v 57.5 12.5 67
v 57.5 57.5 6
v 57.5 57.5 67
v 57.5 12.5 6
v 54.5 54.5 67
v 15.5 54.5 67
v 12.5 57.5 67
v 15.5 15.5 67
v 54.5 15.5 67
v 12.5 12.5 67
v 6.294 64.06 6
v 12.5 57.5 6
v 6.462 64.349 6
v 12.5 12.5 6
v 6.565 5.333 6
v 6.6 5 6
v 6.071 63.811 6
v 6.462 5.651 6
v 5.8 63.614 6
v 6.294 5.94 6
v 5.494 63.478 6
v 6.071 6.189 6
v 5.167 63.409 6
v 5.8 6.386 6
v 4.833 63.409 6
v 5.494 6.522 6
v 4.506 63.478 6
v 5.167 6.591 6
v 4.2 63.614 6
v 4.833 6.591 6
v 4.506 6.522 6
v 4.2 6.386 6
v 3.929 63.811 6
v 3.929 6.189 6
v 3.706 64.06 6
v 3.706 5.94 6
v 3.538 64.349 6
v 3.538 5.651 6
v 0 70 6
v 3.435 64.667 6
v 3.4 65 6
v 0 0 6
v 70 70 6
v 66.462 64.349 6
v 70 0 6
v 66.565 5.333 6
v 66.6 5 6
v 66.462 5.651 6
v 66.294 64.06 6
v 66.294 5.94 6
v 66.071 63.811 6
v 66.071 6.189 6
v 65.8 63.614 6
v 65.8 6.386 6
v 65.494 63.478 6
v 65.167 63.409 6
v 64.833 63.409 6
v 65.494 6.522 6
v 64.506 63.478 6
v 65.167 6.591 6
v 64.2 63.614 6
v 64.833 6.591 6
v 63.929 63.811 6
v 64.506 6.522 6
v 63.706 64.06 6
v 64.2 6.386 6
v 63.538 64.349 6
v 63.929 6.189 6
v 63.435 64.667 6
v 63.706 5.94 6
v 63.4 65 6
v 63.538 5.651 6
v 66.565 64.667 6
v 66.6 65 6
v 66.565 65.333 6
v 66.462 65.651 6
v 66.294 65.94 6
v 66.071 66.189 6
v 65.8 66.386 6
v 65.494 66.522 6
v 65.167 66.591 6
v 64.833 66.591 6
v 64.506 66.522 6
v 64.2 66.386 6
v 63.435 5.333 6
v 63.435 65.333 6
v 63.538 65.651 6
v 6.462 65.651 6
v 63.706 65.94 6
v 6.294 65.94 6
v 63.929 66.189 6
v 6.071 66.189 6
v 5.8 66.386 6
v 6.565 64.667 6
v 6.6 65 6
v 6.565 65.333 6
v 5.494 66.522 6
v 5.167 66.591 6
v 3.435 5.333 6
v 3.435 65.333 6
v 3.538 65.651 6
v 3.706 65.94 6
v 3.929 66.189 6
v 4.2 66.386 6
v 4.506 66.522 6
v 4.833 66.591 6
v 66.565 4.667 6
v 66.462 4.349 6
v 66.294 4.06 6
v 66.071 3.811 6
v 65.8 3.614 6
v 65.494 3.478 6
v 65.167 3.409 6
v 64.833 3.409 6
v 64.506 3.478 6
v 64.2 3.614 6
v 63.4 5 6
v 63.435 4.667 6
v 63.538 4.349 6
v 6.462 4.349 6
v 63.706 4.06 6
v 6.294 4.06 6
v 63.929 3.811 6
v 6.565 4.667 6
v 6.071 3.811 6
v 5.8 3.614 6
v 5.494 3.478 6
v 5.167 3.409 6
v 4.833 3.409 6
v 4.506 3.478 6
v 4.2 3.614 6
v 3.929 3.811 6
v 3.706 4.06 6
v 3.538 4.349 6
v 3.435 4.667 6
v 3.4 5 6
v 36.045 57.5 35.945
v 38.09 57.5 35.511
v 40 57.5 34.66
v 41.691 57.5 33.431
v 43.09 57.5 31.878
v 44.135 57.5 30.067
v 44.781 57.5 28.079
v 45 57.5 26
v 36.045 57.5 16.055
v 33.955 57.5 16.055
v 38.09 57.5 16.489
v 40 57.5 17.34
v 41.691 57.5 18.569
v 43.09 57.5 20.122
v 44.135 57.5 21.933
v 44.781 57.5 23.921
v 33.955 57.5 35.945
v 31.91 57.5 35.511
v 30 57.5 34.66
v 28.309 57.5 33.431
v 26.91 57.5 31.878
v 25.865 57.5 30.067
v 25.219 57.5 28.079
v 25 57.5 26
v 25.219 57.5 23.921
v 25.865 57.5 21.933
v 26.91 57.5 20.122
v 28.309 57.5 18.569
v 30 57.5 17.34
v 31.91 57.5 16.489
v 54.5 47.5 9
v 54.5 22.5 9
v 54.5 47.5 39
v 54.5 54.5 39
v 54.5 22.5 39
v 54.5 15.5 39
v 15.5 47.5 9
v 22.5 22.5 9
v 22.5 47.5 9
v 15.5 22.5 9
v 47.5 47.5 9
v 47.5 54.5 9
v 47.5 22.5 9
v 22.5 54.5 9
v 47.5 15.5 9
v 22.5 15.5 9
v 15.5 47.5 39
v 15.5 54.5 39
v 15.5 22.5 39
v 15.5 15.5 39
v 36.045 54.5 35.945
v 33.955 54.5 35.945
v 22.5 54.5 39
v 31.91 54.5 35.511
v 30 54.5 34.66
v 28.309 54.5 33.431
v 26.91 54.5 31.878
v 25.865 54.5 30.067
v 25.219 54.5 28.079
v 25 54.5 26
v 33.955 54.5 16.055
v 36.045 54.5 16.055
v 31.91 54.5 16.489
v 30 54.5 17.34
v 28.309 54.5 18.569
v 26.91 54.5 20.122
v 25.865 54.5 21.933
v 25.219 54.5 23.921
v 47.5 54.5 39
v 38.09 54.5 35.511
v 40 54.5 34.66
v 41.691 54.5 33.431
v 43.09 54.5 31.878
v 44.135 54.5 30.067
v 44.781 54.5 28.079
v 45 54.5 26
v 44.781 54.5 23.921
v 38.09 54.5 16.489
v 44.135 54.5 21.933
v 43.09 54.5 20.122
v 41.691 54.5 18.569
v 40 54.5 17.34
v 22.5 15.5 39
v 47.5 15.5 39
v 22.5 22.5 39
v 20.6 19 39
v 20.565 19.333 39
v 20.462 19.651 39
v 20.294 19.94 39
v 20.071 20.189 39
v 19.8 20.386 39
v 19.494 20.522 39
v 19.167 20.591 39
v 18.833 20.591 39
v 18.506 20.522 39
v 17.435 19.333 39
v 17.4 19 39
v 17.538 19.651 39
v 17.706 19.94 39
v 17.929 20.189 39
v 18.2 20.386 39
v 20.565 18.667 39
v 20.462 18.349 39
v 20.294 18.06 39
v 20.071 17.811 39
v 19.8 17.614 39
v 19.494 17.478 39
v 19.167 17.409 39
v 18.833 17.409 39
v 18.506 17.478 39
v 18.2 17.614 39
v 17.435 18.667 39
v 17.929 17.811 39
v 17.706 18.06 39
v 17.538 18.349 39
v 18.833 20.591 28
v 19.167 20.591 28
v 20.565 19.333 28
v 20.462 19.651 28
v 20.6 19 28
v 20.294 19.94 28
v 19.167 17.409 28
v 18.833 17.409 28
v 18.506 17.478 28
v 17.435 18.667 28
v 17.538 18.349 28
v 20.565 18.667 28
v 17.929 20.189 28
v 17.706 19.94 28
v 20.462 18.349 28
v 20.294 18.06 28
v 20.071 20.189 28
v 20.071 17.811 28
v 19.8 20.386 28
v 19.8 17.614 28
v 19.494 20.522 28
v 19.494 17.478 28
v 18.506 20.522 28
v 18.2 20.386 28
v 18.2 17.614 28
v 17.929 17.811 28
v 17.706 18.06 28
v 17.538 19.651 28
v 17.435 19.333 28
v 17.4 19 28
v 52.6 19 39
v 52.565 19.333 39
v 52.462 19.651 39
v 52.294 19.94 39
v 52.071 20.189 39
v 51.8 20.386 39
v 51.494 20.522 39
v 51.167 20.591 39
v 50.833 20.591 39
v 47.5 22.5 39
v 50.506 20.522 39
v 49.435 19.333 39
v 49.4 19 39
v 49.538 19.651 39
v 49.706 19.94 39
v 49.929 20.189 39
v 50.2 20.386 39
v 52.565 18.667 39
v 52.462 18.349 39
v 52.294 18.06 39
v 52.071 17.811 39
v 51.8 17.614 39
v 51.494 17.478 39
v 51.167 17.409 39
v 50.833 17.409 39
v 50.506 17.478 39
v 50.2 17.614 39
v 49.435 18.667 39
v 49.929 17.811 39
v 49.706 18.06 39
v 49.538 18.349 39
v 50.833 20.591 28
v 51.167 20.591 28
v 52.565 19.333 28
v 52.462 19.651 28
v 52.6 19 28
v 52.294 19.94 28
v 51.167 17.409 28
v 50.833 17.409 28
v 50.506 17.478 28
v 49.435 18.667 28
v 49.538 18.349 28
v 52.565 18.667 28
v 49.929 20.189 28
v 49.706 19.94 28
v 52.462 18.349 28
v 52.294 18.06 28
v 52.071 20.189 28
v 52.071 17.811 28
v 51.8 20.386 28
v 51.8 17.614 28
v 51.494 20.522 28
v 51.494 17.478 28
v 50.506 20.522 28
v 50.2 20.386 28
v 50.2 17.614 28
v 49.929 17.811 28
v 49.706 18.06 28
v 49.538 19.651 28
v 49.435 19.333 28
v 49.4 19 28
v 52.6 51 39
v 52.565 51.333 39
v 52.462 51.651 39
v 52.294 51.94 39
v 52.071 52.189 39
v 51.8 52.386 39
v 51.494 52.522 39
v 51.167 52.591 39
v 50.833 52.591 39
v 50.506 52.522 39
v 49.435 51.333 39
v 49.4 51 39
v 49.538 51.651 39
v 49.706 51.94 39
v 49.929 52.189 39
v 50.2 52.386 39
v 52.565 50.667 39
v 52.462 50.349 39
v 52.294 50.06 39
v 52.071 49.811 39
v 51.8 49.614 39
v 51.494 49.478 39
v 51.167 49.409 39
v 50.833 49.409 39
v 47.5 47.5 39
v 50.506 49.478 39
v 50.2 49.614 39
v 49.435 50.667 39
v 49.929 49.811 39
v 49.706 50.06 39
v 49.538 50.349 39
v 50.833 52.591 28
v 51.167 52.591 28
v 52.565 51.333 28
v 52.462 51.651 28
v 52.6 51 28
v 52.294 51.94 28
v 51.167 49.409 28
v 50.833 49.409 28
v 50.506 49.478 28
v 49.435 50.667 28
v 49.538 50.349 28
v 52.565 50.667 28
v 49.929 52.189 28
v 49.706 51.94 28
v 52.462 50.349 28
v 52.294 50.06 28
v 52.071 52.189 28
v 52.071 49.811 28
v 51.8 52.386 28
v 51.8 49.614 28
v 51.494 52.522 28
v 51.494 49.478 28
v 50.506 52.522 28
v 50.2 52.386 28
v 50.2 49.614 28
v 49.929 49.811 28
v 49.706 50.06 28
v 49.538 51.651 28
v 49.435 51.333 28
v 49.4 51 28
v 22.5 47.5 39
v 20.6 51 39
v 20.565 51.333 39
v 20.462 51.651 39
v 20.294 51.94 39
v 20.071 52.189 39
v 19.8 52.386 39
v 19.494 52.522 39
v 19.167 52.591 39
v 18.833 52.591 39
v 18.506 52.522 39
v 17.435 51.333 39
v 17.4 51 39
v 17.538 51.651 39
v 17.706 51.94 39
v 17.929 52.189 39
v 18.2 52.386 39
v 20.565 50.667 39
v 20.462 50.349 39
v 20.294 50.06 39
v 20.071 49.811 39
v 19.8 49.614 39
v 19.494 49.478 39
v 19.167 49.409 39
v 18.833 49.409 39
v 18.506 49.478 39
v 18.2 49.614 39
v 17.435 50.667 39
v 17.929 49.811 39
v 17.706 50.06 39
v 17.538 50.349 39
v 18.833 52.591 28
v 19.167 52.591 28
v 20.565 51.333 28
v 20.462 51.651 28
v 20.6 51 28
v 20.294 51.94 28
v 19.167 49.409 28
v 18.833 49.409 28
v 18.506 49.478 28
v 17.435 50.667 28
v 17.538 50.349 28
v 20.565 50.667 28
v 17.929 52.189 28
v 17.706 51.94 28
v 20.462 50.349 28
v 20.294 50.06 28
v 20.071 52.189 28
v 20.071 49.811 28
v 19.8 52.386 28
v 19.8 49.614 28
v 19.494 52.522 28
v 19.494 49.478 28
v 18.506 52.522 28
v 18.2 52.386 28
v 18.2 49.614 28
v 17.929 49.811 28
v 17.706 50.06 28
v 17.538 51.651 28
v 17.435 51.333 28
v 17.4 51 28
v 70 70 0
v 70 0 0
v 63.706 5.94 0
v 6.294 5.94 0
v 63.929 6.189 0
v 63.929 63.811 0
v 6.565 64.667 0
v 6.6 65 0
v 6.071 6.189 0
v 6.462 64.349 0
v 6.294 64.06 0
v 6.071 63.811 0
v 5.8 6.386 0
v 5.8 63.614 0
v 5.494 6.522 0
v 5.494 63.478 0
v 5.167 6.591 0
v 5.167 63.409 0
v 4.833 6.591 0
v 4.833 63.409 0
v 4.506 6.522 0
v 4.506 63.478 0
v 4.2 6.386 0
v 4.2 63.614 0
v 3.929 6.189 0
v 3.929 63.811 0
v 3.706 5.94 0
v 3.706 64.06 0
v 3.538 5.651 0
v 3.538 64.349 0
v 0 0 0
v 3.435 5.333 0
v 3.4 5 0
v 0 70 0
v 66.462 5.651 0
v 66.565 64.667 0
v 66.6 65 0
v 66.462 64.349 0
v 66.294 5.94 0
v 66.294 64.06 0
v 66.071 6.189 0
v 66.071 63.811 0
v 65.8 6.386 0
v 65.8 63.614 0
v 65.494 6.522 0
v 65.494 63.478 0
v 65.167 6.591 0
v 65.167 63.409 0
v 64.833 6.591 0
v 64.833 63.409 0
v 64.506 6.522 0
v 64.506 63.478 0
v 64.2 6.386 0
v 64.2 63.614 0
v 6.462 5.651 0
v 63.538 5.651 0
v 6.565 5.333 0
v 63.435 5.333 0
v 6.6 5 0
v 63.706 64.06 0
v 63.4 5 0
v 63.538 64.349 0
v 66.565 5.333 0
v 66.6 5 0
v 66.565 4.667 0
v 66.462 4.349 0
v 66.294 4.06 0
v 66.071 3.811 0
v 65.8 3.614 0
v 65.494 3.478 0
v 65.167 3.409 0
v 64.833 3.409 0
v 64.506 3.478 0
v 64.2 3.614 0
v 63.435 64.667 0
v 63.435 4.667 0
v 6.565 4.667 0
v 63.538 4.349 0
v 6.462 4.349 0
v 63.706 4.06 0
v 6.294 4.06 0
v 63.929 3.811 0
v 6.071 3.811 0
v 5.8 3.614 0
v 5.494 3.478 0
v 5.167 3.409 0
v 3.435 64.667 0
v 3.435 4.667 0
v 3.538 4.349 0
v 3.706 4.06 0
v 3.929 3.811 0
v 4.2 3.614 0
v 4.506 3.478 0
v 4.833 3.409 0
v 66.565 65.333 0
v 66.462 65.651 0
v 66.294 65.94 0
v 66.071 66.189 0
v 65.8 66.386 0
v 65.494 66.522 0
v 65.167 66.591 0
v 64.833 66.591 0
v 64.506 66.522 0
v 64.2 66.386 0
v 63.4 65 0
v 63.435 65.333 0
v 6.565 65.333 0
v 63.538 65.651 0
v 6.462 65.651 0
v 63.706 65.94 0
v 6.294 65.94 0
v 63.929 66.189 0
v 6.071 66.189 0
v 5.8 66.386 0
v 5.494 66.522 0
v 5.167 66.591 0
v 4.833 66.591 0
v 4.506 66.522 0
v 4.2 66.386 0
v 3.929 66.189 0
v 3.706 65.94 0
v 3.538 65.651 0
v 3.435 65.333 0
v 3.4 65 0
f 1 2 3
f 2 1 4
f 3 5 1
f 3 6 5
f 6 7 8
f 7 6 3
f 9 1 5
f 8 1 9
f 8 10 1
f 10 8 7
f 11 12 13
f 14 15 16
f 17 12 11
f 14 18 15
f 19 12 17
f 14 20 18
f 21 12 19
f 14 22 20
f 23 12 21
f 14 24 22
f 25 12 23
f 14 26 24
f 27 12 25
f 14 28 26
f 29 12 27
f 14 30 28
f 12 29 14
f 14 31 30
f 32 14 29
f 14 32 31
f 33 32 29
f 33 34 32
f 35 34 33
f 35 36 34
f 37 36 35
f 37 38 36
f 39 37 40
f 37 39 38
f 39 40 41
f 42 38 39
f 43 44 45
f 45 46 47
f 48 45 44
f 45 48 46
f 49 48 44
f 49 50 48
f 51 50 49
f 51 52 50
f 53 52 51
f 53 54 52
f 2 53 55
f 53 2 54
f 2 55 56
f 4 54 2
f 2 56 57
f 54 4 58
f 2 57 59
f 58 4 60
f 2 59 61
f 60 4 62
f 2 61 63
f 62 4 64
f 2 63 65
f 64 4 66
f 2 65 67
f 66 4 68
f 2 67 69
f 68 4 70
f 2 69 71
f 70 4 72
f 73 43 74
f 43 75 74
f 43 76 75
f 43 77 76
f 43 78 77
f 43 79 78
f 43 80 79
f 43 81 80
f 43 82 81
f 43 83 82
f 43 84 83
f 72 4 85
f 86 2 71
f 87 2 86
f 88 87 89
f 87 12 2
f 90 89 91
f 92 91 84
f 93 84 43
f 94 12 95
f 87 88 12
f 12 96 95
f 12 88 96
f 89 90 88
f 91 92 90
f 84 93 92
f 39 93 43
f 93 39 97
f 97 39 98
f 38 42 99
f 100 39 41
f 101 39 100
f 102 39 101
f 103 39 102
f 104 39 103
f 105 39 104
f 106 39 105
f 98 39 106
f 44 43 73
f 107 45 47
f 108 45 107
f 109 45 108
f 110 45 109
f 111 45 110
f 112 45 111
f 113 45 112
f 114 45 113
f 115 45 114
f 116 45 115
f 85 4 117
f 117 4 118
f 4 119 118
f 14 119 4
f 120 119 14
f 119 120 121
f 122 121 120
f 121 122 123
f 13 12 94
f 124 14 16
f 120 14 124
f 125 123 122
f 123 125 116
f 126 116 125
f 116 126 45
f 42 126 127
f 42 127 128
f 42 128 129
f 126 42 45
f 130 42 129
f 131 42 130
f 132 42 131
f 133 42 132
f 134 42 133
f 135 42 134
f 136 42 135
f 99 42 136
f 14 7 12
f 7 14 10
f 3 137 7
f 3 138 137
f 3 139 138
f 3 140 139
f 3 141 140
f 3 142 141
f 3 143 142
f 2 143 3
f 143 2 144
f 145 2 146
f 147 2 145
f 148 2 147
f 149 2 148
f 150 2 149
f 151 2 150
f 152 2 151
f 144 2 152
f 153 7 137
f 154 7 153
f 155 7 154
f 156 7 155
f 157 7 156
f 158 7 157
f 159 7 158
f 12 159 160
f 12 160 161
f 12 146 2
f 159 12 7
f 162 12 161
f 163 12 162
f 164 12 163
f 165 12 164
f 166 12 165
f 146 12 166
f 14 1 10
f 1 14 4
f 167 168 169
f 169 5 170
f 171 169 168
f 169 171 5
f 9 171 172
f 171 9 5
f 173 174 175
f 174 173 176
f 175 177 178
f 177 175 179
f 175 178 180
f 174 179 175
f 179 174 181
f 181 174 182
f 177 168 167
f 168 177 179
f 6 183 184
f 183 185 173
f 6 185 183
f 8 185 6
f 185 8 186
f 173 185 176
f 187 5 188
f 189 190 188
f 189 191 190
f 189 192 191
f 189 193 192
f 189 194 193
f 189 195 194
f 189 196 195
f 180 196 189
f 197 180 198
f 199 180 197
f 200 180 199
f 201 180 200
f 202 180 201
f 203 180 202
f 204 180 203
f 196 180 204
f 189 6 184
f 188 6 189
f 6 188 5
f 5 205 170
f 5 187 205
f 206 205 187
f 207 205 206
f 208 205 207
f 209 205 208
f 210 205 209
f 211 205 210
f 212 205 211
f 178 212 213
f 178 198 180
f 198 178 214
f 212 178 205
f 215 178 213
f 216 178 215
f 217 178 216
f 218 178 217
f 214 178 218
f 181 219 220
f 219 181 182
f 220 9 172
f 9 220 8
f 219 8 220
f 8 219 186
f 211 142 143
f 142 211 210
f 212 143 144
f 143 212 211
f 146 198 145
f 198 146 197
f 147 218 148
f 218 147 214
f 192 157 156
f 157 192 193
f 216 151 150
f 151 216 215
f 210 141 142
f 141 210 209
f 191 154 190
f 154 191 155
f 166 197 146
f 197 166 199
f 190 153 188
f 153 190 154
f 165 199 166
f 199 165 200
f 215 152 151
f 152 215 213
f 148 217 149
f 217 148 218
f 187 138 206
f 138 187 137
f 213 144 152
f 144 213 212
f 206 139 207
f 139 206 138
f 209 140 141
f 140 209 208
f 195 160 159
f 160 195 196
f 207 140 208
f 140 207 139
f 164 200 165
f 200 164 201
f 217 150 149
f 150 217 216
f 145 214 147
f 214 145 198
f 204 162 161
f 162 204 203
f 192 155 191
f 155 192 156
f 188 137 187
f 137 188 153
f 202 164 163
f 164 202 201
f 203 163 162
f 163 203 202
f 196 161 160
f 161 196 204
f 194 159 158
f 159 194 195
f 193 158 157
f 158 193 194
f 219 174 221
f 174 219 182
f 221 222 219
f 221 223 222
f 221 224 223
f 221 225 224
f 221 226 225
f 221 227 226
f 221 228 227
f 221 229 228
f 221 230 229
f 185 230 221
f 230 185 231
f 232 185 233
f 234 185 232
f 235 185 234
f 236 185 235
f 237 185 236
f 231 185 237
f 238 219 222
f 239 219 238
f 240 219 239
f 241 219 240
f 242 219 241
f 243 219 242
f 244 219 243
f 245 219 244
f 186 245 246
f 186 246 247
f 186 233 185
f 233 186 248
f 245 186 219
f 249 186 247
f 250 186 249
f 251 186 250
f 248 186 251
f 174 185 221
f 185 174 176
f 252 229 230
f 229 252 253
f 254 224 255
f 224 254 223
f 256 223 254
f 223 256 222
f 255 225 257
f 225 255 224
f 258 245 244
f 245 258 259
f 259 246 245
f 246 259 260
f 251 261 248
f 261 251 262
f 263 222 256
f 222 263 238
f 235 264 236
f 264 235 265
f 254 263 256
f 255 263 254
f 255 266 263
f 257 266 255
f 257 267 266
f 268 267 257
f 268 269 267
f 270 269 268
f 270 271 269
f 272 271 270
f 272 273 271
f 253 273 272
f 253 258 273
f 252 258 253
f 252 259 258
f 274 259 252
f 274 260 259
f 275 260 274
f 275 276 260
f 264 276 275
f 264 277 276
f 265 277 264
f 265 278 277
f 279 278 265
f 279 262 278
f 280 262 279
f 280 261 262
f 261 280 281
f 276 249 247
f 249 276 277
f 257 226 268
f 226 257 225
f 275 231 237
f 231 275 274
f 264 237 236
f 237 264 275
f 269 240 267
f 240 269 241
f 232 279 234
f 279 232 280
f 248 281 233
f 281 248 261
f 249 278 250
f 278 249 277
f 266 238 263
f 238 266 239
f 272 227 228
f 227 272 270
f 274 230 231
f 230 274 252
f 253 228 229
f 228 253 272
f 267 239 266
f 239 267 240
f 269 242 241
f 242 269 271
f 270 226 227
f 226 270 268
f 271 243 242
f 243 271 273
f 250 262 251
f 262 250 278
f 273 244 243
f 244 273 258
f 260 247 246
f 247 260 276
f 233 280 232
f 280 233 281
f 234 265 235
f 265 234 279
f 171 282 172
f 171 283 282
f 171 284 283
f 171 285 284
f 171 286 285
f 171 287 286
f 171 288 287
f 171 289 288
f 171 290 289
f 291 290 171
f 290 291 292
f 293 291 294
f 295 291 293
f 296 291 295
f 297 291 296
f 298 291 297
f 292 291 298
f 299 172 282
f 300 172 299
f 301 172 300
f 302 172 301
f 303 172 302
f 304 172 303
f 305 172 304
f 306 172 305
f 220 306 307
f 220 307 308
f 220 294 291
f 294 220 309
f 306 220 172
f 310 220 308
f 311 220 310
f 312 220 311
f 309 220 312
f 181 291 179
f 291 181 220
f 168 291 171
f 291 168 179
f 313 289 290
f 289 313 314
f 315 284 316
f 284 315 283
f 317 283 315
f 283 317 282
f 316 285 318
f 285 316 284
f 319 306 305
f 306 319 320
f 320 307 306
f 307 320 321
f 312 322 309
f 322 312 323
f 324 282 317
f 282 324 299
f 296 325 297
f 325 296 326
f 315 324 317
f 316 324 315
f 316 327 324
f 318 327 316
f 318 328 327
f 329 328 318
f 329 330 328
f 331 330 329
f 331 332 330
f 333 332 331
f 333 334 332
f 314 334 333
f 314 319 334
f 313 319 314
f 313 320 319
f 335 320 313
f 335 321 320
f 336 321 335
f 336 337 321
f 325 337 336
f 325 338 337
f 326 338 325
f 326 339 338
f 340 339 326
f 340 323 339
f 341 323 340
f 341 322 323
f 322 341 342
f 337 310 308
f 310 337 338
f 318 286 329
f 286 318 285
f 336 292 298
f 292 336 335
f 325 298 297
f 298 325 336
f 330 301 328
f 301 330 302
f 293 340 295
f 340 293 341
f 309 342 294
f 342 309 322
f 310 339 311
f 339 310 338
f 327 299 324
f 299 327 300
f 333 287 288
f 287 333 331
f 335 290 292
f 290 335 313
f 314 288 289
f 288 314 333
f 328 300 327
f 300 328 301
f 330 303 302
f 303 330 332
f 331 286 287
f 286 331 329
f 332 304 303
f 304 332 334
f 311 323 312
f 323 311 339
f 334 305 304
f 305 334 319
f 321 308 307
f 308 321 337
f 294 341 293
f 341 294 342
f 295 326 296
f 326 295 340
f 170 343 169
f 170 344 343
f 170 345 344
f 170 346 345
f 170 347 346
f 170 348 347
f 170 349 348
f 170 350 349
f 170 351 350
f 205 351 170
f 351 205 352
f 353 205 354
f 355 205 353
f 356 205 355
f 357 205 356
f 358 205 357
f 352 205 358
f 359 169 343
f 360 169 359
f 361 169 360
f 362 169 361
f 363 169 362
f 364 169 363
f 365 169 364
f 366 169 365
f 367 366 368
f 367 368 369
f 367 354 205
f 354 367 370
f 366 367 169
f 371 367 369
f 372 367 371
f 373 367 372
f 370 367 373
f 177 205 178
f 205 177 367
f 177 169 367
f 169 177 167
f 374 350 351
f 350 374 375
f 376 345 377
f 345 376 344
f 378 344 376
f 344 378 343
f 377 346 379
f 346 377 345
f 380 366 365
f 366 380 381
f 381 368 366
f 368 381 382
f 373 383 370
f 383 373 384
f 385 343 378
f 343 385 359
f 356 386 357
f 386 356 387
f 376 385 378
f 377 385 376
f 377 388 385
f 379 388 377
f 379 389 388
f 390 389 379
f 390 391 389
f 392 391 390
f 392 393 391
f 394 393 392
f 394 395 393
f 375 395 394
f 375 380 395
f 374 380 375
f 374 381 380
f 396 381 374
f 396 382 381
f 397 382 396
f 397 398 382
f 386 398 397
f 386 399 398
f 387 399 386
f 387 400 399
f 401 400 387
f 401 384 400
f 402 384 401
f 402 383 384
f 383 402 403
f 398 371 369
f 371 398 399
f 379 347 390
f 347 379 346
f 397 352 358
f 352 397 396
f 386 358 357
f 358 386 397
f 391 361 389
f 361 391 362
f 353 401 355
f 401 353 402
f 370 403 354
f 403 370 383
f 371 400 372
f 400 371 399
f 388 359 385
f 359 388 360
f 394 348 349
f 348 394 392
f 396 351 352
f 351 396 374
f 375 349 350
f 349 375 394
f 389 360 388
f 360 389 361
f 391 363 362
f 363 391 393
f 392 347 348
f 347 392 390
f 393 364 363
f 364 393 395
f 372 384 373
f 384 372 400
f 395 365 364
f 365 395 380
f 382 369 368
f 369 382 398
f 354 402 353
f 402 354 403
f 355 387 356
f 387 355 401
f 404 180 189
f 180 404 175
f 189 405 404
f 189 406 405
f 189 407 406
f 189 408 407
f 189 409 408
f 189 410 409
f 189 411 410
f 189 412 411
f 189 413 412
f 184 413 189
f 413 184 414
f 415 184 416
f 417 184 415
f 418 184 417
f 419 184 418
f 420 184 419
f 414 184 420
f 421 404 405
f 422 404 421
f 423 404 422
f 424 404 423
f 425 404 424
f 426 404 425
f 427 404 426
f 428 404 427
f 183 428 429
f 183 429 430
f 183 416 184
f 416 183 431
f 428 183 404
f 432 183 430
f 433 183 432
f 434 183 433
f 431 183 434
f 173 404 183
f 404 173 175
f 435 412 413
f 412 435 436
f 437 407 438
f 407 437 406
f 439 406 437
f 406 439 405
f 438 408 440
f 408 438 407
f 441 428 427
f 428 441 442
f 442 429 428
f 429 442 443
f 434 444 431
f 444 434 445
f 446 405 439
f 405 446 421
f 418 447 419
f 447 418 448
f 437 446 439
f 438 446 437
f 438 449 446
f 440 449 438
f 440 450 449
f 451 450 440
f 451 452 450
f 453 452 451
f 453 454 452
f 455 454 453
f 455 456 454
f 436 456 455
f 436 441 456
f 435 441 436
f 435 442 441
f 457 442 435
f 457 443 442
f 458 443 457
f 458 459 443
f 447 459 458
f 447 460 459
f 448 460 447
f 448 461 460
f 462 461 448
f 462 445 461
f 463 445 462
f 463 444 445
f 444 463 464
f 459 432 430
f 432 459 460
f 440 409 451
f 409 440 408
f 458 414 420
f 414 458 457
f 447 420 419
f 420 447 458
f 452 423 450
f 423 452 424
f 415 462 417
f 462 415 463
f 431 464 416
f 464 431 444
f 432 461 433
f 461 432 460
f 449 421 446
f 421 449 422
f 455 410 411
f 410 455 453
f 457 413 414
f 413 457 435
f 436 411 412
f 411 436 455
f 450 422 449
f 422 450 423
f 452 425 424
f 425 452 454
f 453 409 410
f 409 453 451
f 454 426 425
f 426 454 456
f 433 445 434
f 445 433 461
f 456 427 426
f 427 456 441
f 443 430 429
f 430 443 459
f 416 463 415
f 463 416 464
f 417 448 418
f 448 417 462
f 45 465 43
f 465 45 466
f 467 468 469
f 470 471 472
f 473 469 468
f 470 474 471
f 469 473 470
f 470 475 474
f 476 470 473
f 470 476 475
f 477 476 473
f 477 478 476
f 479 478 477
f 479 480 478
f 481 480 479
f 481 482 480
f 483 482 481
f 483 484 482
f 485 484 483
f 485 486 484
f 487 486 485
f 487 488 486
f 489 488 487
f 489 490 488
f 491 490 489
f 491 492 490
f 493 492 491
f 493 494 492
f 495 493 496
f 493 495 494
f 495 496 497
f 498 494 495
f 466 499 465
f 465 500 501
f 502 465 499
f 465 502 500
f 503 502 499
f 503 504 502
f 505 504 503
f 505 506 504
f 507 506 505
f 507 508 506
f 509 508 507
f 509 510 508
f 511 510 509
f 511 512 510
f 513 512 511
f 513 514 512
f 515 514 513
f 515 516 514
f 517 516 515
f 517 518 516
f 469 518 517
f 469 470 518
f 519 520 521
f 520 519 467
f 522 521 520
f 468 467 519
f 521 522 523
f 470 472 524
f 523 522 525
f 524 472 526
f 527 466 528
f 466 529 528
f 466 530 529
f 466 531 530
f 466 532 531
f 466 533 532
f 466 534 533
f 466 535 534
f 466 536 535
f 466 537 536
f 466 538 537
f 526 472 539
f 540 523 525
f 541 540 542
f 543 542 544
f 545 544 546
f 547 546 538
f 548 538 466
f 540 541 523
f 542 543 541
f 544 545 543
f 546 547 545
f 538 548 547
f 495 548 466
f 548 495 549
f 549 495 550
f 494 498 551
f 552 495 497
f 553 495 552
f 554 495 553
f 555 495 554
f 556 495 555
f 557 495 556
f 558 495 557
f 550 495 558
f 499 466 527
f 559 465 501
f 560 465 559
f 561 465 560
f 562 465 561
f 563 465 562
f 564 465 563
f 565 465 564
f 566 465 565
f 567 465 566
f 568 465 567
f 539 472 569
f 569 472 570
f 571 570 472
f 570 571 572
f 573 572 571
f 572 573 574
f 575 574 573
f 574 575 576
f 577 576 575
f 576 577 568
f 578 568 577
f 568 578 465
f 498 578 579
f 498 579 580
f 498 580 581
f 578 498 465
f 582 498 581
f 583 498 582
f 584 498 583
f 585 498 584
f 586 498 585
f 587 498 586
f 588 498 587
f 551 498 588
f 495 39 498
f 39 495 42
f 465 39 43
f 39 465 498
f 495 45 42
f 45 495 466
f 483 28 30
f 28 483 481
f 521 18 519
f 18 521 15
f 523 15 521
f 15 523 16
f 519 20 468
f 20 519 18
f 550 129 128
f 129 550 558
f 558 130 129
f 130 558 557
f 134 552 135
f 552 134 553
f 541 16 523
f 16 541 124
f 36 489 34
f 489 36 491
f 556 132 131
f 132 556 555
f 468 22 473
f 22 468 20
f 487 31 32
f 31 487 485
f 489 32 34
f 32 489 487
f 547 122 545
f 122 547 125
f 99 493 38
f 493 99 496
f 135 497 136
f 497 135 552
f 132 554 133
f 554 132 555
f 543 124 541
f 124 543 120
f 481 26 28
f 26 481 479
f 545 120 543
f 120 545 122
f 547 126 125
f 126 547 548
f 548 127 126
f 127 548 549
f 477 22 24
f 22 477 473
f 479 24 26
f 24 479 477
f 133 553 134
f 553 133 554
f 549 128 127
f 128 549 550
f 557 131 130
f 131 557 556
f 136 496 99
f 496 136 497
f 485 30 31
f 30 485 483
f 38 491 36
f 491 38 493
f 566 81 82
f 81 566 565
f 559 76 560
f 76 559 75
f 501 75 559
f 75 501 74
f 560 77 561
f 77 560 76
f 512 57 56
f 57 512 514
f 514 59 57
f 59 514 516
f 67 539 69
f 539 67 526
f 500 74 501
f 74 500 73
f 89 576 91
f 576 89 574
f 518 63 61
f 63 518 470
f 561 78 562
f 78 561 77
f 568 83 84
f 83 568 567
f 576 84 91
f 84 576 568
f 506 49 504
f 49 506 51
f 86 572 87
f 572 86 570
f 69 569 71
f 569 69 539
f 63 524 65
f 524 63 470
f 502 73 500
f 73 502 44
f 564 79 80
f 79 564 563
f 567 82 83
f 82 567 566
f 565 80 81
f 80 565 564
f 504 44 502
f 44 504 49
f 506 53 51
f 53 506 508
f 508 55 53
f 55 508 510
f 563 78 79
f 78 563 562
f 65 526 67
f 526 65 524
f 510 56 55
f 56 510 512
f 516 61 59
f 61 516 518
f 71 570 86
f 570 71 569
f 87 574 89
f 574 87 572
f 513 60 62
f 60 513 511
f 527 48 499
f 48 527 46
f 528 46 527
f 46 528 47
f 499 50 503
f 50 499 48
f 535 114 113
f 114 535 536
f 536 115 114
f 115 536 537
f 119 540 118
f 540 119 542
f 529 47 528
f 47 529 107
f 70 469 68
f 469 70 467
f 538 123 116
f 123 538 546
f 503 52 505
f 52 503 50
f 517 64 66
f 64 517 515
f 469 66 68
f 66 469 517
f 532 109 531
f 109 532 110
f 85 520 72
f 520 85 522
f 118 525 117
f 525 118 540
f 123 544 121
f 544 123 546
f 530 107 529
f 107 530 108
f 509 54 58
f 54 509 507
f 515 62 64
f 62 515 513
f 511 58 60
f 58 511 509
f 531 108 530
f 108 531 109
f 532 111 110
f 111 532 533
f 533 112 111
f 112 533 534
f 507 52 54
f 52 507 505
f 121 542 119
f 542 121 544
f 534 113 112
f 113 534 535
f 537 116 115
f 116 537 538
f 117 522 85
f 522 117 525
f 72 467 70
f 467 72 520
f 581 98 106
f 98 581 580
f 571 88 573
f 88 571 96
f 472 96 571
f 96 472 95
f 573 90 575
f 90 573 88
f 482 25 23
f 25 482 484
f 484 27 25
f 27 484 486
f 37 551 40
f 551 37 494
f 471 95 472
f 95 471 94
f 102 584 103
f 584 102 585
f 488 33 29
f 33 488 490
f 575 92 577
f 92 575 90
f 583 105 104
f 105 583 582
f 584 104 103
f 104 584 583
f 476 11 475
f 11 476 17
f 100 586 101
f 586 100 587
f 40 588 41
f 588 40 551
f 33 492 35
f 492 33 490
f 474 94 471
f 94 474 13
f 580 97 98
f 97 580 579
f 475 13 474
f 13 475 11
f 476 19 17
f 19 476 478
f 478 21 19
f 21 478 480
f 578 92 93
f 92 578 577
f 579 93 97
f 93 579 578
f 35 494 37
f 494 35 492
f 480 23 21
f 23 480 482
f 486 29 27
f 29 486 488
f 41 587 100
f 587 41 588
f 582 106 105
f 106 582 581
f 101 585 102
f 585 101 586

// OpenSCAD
//cable hole diameter
cb_diameter = 20;

//base of camera board to top of lens
cam_h = 25;

//height camera should be suspended above the bottom of the box
cam_suspend_h = 30;

//side length of square indents the camera board will rest on
rest_indent_l = 7;

//whole camera board length. It is square
cam_board_l = 39;

//wall thickness of box x2
wall_thick = 6;

//length of box
box_l = cam_board_l+wall_thick;


//base square length
base_l = 70;

//added distance to get to middle of base square
base_add = (base_l-(cam_board_l+wall_thick))/2;

//subract cylinder from box with subracted box
translate([base_add, base_add, wall_thick])
{
difference()
{
// make cube which will be subtracted from bigger cube
difference()
{
{cube([cam_board_l+wall_thick, cam_board_l+wall_thick, cam_suspend_h+cam_h+wall_thick]);

translate([wall_thick/2, wall_thick/2, wall_thick/2])
{cube([cam_board_l, cam_board_l, cam_suspend_h+cam_h+5]);}

}}
// check how to rotate a cylinder

//make cylinder
//rotate by degrees around a defined axis

//define where to put hole
translate([box_l/2,box_l+1,20])
{rotate([90,0,0])
{cylinder(h=wall_thick/2+2, r1 = cb_diameter/2, r2 = cb_diameter/2);
}}}}


//change circularity of cylinder
$fn = 30;

//add indents for camera to rest on

// define thickness of the indent
indent_h = cam_suspend_h;

//module for supporting pillars
module pillar(){
    cube([rest_indent_l, rest_indent_l, indent_h]);
}

//module for m3 screw holes with a 0.1mm tolerance
module m3_hole(){
    diameter=3;
    tol = 0.1;
    cylinder(h=wall_thick*2, d1 = 
    diameter+tol*2, d2 = diameter+tol*2);
}

translate([base_add, base_add, wall_thick])
{
//make indent cube and move it to the corners of the box
translate([wall_thick/2,wall_thick/2,wall_thick/2])   
{difference(){
pillar();
 translate([rest_indent_l/2, rest_indent_l/2, cam_suspend_h-wall_thick*2+1]){    
 m3_hole();}}
}

//indent 2
translate([cam_board_l-wall_thick/1.5,wall_thick/2,wall_thick/2])
{difference(){
pillar();
 translate([rest_indent_l/2, rest_indent_l/2, cam_suspend_h-wall_thick*2+1]){    
 m3_hole();}}
}

//indent 3
translate([cam_board_l-wall_thick/1.5,cam_board_l-wall_thick/1.5,wall_thick/2])
{difference(){
pillar();
 translate([rest_indent_l/2, rest_indent_l/2, cam_suspend_h-wall_thick*2+1]){    
 m3_hole();}}
}

//indent 4
translate([wall_thick/2,cam_board_l-wall_thick/1.5,wall_thick/2])
{difference(){
pillar();
 translate([rest_indent_l/2, rest_indent_l/2, cam_suspend_h-wall_thick*2+1]){    
 m3_hole();}}
}
}

//how far in m3 holes should be
m3_loc = 5;

//make base plate and drill holes
difference()
{
cube([base_l, base_l, wall_thick]);
    
 translate([m3_loc, m3_loc, -1]){
 m3_hole();}

 translate([base_l-m3_loc, base_l-m3_loc,-1]){
 m3_hole();}

 translate([base_l-m3_loc, m3_loc,-1]){
 m3_hole();}

 translate([m3_loc, base_l-m3_loc, -1]){
 m3_hole();}
} 
